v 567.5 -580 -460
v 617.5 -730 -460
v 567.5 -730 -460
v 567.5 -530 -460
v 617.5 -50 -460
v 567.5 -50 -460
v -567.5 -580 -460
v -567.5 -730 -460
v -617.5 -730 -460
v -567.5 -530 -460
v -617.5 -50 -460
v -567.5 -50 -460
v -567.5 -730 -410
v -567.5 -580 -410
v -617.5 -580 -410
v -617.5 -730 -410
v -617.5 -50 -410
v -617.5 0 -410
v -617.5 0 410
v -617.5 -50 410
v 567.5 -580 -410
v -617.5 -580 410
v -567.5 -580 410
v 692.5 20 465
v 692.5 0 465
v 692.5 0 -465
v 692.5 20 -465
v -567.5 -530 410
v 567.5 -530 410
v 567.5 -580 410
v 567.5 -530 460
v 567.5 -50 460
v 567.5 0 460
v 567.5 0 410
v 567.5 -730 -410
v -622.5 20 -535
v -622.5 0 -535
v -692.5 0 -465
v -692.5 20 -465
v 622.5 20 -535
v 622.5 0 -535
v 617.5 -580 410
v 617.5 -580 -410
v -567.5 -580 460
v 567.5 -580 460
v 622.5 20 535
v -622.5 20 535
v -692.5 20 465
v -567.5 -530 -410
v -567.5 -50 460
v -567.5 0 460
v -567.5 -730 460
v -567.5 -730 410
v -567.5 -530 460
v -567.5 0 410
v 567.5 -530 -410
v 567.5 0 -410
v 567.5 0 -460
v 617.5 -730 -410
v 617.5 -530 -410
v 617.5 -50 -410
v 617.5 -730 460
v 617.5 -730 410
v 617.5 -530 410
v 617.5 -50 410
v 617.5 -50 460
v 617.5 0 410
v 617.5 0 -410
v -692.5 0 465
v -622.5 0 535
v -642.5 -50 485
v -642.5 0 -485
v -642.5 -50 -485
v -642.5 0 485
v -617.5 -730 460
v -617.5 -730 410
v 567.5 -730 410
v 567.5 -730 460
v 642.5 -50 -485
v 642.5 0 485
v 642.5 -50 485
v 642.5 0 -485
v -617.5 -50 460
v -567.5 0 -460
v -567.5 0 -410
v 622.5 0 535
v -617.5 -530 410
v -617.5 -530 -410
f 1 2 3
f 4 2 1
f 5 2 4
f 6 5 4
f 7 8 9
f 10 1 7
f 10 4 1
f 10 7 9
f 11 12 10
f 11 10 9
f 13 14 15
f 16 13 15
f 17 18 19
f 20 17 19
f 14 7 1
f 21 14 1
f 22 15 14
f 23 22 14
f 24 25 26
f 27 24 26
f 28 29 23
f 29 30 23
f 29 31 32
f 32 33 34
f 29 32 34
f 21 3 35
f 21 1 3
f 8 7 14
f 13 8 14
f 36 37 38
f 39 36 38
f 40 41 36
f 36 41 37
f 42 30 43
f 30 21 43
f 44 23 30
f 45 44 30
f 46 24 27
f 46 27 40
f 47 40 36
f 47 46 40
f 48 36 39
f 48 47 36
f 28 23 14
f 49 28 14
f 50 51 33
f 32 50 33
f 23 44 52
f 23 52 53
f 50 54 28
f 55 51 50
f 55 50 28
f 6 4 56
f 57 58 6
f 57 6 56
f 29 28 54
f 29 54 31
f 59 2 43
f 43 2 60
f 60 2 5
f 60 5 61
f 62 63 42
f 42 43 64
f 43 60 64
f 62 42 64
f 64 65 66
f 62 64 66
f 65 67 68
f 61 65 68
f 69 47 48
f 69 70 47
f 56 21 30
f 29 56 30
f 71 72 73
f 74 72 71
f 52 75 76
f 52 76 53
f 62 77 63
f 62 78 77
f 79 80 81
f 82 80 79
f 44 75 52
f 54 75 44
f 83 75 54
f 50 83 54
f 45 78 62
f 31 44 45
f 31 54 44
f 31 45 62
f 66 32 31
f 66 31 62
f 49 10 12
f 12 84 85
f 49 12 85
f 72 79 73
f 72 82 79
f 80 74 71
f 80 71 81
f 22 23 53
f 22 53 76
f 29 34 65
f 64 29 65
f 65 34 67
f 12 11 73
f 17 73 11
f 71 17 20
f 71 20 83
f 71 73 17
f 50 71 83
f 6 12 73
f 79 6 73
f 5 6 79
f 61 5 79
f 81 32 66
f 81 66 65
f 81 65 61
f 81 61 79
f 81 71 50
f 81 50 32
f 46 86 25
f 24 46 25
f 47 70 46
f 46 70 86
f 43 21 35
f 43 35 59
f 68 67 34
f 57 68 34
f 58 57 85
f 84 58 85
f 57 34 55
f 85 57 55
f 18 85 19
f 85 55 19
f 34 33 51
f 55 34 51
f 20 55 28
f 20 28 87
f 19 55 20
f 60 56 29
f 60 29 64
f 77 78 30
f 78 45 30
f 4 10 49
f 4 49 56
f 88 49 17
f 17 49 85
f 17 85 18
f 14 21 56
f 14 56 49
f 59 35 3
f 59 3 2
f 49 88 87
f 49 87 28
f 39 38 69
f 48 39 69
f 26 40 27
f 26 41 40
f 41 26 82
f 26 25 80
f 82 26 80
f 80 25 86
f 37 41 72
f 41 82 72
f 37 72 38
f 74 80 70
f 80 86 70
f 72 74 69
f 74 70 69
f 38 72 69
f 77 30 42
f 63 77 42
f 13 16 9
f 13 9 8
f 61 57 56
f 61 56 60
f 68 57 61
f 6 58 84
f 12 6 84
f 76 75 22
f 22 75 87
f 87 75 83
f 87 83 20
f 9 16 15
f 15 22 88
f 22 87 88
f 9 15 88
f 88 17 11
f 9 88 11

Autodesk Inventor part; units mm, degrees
ref_plane "YZ Plane" through (0, 0, 0) normal (1, 0, 0) x (0, 1, 0)
ref_plane "XZ Plane" through (0, 0, 0) normal (0, 1, 0) x (-1, 0, 0)
sketch "Boceto1" plane through (0, 0, 0) normal (0, 1, 0) x (-1, 0, 0)
  line L0 (692.5, 535) -> (-692.5, 535)
  line L1 (-692.5, 535) -> (-692.5, -535)
  line L2 (-692.5, -535) -> (692.5, -535)
  line L3 (692.5, -535) -> (692.5, 535)
  line L4 (622.5, 535) -> (692.5, 465)
  line L5 (692.5, 0) -> (-692.5, 0)
  line L6 (0, 535) -> (0, -535)
  line L7 (622.5, -535) -> (692.5, -465)
  line L8 (-622.5, 535) -> (-692.5, 465)
  line L9 (-622.5, -535) -> (-692.5, -465)
  arc A0 (-507.7191, -338.4764) -> (-457.7841, -385.927) centre (-457.7841, -335.927) ccw projected
  line L10 (-457.7841, -385.927) -> (492.0857, -385.927) projected
  arc A1 (492.0857, -385.927) -> (542.0206, -333.3776) centre (492.0857, -335.927) ccw projected
  line L11 (542.0206, -333.3776) -> (507.8137, 336.6224) projected
  arc A2 (507.8137, 336.6224) -> (457.8787, 384.073) centre (457.8787, 334.073) ccw projected
  line L12 (457.8787, 384.073) -> (-491.991, 384.073) projected
  arc A3 (-491.991, 384.073) -> (-541.926, 331.5236) centre (-491.991, 334.073) ccw projected
  line L13 (-541.926, 331.5236) -> (-507.7191, -338.4764) projected
  point P0 (0, 0)
  point P1 (-692.5, -465)
  point P2 (622.5, -535)
  point P3 (692.5, -465)
  dimension "d0" = 1070
  dimension "d1" = 1385
  dimension "d2" = 692.5
  dimension "d3" = 535
  dimension "d4" = 70
  dimension "d5" = 70
  dimension "d27" = 770
extrude "Extrusión1" add sketch "Boceto1" along normal blind 20 contours L4 L3 L5 L11 A2 L12 L6 L0 | L6 L12 A3 L13 L5 L1 L8 L0 | L3 L7 L2 L6 L10 A1 L11 L5 | L12 A2 L11 L5 L6 | L6 L5 L13 A3 L12 | L11 A1 L10 L6 L5 | L6 L10 A0 L13 L5 | L5 L13 A0 L10 L6 L2 L9 L1
sketch "Boceto2" plane through (0, 0, 0) normal (0, -1, 0) x (1, 0, 0)
  line L0 (-642.5, 485) -> (642.5, 485)
  line L1 (642.5, 485) -> (642.5, -485)
  line L2 (642.5, -485) -> (-642.5, -485)
  line L3 (-642.5, -485) -> (-642.5, 485)
  line L4 (-622.5, 535) -> (622.5, 535) projected
  line L5 (-692.5, -465) -> (-692.5, 465) projected
  line L6 (622.5, -535) -> (-622.5, -535) projected
  line L7 (692.5, 465) -> (692.5, -465) projected
  line L8 (-617.5, 460) -> (617.5, 460)
  line L9 (617.5, 460) -> (617.5, -460)
  line L10 (617.5, -460) -> (-617.5, -460)
  line L11 (-617.5, -460) -> (-617.5, 460)
  point P0 (0, 0)
  dimension "d8" = 50
  dimension "d9" = 50
  dimension "d10" = 50
  dimension "d11" = 50
  dimension "d12" = 25
  dimension "d13" = 25
  dimension "d14" = 25
  dimension "d15" = 25
extrude "Extrusión2" add sketch "Boceto2" along normal blind 50
sketch "Boceto3" plane through (0, 0, 0) normal (0, -1, 0) x (1, 0, 0)
  line L0 (-617.5, 460) -> (617.5, 460) projected
  line L1 (-617.5, 460) -> (-567.5, 460)
  line L2 (-567.5, 460) -> (-567.5, 410)
  line L3 (-567.5, 410) -> (-617.5, 410)
  line L4 (-617.5, 410) -> (-617.5, 460)
  line L5 (0, 460) -> (0, -460)
  line L6 (617.5, -460) -> (-617.5, -460) projected
  line L7 (-617.5, 460) -> (-617.5, -460) projected
  line L8 (-617.5, 0) -> (472.5, 0)
  line L9 (617.5, 460) -> (567.5, 460)
  line L10 (567.5, 460) -> (567.5, 410)
  line L11 (567.5, 410) -> (617.5, 410)
  line L12 (617.5, 410) -> (617.5, 460)
  line L13 (-617.5, -460) -> (-567.5, -460)
  line L14 (-567.5, -460) -> (-567.5, -410)
  line L15 (-567.5, -410) -> (-617.5, -410)
  line L16 (-617.5, -410) -> (-617.5, -460)
  line L17 (617.5, -460) -> (567.5, -460)
  line L18 (567.5, -460) -> (567.5, -410)
  line L19 (567.5, -410) -> (617.5, -410)
  line L20 (617.5, -410) -> (617.5, -460)
  point P0 (0, 0)
  point P1 (567.5, 460)
  point P2 (567.5, -460)
  point P3 (-617.5, -410)
  point P4 (-567.5, -460)
  dimension "d18" = 50
  dimension "d19" = 50
extrude "Extrusión3" add sketch "Boceto3" along normal blind 730 contours L0 L12 L11 L10 | L18 L19 L20 L6 | L0 L2 L3 L4 | L15 L14 L6 L7
sketch "Boceto4" plane through (-617.5, -50, 460) normal (0, 0, 1) x (1, 0, 0)
  line L0 (0, 0) -> (0, -680) projected
  line L1 (0, -530) -> (50, -530)
  line L2 (50, 0) -> (50, -680) projected
  line L3 (50, -680) -> (0, -680) projected
  point P0 (617.5, 50)
  dimension "d23" = 150
sketch "Boceto5" plane through (567.5, 0, -410) normal (0, 0, 1) x (1, 0, 0)
  line L0 (0, -50) -> (0, -730) projected
  line L1 (0, -580) -> (50, -580)
  line L2 (50, -50) -> (50, -730) projected
  line L3 (50, -730) -> (0, -730) projected
  point P0 (-567.5, 0)
  dimension "d24" = 150
ref_plane "Plano de trabajo2" through (-617.5, -580, 460) normal (0, 1, 0) x (1, 0, 0)
sketch "Boceto6" plane through (-617.5, -580, 460) normal (0, 1, 0) x (1, 0, 0)
  line L0 (0, 0) -> (50, 0) projected
  line L1 (1235, 50) -> (1185, 50) projected
  line L2 (50, 0) -> (1185, 0)
  line L3 (1185, 0) -> (1185, 50)
  line L4 (1185, 50) -> (50, 50)
  line L5 (50, 50) -> (50, 0)
  line L6 (1185, 50) -> (1185, 0) projected
  line L7 (1235, 50) -> (1235, 870) projected
  line L8 (1185, 50) -> (1235, 50)
  line L9 (1235, 50) -> (1235, 870)
  line L10 (1235, 870) -> (1185, 870)
  line L11 (1185, 870) -> (1185, 50)
  line L12 (1185, 920) -> (1185, 870) projected
  line L13 (50, 870) -> (50, 920) projected
  line L14 (1185, 870) -> (50, 870)
  line L15 (50, 870) -> (50, 920)
  line L16 (50, 920) -> (1185, 920)
  line L17 (1185, 920) -> (1185, 870)
  line L18 (0, 870) -> (0, 50) projected
  line L19 (50, 870) -> (0, 870)
  line L20 (0, 870) -> (0, 50)
  line L21 (0, 50) -> (50, 50)
  line L22 (50, 50) -> (50, 870)
  point P0 (617.5, 460)
  point P1 (50, 50)
  point P2 (50, 50)
  point P3 (50, 870)
  point P4 (50, 870)
  point P5 (0, 870)
extrude "Extrusión4" add sketch "Boceto6" along normal blind 50 contours L1 L11 L10 L7 | L3 L2 L5 L4 | L21 L18 L19 L22 | L14 L13 L16 L12
equation "\"d2\" = 0.5 * d1"
equation "\"d3\" = 0.5 * d0"
equation "\"d9\" = d8"
equation "\"d10\" = d8"
equation "\"d11\" = d9"
equation "\"d13\" = d12"
equation "\"d14\" = d12"
equation "\"d15\" = d12"
equation "\"d18\" = d19"
properties part number "Mesa_Centrado"
